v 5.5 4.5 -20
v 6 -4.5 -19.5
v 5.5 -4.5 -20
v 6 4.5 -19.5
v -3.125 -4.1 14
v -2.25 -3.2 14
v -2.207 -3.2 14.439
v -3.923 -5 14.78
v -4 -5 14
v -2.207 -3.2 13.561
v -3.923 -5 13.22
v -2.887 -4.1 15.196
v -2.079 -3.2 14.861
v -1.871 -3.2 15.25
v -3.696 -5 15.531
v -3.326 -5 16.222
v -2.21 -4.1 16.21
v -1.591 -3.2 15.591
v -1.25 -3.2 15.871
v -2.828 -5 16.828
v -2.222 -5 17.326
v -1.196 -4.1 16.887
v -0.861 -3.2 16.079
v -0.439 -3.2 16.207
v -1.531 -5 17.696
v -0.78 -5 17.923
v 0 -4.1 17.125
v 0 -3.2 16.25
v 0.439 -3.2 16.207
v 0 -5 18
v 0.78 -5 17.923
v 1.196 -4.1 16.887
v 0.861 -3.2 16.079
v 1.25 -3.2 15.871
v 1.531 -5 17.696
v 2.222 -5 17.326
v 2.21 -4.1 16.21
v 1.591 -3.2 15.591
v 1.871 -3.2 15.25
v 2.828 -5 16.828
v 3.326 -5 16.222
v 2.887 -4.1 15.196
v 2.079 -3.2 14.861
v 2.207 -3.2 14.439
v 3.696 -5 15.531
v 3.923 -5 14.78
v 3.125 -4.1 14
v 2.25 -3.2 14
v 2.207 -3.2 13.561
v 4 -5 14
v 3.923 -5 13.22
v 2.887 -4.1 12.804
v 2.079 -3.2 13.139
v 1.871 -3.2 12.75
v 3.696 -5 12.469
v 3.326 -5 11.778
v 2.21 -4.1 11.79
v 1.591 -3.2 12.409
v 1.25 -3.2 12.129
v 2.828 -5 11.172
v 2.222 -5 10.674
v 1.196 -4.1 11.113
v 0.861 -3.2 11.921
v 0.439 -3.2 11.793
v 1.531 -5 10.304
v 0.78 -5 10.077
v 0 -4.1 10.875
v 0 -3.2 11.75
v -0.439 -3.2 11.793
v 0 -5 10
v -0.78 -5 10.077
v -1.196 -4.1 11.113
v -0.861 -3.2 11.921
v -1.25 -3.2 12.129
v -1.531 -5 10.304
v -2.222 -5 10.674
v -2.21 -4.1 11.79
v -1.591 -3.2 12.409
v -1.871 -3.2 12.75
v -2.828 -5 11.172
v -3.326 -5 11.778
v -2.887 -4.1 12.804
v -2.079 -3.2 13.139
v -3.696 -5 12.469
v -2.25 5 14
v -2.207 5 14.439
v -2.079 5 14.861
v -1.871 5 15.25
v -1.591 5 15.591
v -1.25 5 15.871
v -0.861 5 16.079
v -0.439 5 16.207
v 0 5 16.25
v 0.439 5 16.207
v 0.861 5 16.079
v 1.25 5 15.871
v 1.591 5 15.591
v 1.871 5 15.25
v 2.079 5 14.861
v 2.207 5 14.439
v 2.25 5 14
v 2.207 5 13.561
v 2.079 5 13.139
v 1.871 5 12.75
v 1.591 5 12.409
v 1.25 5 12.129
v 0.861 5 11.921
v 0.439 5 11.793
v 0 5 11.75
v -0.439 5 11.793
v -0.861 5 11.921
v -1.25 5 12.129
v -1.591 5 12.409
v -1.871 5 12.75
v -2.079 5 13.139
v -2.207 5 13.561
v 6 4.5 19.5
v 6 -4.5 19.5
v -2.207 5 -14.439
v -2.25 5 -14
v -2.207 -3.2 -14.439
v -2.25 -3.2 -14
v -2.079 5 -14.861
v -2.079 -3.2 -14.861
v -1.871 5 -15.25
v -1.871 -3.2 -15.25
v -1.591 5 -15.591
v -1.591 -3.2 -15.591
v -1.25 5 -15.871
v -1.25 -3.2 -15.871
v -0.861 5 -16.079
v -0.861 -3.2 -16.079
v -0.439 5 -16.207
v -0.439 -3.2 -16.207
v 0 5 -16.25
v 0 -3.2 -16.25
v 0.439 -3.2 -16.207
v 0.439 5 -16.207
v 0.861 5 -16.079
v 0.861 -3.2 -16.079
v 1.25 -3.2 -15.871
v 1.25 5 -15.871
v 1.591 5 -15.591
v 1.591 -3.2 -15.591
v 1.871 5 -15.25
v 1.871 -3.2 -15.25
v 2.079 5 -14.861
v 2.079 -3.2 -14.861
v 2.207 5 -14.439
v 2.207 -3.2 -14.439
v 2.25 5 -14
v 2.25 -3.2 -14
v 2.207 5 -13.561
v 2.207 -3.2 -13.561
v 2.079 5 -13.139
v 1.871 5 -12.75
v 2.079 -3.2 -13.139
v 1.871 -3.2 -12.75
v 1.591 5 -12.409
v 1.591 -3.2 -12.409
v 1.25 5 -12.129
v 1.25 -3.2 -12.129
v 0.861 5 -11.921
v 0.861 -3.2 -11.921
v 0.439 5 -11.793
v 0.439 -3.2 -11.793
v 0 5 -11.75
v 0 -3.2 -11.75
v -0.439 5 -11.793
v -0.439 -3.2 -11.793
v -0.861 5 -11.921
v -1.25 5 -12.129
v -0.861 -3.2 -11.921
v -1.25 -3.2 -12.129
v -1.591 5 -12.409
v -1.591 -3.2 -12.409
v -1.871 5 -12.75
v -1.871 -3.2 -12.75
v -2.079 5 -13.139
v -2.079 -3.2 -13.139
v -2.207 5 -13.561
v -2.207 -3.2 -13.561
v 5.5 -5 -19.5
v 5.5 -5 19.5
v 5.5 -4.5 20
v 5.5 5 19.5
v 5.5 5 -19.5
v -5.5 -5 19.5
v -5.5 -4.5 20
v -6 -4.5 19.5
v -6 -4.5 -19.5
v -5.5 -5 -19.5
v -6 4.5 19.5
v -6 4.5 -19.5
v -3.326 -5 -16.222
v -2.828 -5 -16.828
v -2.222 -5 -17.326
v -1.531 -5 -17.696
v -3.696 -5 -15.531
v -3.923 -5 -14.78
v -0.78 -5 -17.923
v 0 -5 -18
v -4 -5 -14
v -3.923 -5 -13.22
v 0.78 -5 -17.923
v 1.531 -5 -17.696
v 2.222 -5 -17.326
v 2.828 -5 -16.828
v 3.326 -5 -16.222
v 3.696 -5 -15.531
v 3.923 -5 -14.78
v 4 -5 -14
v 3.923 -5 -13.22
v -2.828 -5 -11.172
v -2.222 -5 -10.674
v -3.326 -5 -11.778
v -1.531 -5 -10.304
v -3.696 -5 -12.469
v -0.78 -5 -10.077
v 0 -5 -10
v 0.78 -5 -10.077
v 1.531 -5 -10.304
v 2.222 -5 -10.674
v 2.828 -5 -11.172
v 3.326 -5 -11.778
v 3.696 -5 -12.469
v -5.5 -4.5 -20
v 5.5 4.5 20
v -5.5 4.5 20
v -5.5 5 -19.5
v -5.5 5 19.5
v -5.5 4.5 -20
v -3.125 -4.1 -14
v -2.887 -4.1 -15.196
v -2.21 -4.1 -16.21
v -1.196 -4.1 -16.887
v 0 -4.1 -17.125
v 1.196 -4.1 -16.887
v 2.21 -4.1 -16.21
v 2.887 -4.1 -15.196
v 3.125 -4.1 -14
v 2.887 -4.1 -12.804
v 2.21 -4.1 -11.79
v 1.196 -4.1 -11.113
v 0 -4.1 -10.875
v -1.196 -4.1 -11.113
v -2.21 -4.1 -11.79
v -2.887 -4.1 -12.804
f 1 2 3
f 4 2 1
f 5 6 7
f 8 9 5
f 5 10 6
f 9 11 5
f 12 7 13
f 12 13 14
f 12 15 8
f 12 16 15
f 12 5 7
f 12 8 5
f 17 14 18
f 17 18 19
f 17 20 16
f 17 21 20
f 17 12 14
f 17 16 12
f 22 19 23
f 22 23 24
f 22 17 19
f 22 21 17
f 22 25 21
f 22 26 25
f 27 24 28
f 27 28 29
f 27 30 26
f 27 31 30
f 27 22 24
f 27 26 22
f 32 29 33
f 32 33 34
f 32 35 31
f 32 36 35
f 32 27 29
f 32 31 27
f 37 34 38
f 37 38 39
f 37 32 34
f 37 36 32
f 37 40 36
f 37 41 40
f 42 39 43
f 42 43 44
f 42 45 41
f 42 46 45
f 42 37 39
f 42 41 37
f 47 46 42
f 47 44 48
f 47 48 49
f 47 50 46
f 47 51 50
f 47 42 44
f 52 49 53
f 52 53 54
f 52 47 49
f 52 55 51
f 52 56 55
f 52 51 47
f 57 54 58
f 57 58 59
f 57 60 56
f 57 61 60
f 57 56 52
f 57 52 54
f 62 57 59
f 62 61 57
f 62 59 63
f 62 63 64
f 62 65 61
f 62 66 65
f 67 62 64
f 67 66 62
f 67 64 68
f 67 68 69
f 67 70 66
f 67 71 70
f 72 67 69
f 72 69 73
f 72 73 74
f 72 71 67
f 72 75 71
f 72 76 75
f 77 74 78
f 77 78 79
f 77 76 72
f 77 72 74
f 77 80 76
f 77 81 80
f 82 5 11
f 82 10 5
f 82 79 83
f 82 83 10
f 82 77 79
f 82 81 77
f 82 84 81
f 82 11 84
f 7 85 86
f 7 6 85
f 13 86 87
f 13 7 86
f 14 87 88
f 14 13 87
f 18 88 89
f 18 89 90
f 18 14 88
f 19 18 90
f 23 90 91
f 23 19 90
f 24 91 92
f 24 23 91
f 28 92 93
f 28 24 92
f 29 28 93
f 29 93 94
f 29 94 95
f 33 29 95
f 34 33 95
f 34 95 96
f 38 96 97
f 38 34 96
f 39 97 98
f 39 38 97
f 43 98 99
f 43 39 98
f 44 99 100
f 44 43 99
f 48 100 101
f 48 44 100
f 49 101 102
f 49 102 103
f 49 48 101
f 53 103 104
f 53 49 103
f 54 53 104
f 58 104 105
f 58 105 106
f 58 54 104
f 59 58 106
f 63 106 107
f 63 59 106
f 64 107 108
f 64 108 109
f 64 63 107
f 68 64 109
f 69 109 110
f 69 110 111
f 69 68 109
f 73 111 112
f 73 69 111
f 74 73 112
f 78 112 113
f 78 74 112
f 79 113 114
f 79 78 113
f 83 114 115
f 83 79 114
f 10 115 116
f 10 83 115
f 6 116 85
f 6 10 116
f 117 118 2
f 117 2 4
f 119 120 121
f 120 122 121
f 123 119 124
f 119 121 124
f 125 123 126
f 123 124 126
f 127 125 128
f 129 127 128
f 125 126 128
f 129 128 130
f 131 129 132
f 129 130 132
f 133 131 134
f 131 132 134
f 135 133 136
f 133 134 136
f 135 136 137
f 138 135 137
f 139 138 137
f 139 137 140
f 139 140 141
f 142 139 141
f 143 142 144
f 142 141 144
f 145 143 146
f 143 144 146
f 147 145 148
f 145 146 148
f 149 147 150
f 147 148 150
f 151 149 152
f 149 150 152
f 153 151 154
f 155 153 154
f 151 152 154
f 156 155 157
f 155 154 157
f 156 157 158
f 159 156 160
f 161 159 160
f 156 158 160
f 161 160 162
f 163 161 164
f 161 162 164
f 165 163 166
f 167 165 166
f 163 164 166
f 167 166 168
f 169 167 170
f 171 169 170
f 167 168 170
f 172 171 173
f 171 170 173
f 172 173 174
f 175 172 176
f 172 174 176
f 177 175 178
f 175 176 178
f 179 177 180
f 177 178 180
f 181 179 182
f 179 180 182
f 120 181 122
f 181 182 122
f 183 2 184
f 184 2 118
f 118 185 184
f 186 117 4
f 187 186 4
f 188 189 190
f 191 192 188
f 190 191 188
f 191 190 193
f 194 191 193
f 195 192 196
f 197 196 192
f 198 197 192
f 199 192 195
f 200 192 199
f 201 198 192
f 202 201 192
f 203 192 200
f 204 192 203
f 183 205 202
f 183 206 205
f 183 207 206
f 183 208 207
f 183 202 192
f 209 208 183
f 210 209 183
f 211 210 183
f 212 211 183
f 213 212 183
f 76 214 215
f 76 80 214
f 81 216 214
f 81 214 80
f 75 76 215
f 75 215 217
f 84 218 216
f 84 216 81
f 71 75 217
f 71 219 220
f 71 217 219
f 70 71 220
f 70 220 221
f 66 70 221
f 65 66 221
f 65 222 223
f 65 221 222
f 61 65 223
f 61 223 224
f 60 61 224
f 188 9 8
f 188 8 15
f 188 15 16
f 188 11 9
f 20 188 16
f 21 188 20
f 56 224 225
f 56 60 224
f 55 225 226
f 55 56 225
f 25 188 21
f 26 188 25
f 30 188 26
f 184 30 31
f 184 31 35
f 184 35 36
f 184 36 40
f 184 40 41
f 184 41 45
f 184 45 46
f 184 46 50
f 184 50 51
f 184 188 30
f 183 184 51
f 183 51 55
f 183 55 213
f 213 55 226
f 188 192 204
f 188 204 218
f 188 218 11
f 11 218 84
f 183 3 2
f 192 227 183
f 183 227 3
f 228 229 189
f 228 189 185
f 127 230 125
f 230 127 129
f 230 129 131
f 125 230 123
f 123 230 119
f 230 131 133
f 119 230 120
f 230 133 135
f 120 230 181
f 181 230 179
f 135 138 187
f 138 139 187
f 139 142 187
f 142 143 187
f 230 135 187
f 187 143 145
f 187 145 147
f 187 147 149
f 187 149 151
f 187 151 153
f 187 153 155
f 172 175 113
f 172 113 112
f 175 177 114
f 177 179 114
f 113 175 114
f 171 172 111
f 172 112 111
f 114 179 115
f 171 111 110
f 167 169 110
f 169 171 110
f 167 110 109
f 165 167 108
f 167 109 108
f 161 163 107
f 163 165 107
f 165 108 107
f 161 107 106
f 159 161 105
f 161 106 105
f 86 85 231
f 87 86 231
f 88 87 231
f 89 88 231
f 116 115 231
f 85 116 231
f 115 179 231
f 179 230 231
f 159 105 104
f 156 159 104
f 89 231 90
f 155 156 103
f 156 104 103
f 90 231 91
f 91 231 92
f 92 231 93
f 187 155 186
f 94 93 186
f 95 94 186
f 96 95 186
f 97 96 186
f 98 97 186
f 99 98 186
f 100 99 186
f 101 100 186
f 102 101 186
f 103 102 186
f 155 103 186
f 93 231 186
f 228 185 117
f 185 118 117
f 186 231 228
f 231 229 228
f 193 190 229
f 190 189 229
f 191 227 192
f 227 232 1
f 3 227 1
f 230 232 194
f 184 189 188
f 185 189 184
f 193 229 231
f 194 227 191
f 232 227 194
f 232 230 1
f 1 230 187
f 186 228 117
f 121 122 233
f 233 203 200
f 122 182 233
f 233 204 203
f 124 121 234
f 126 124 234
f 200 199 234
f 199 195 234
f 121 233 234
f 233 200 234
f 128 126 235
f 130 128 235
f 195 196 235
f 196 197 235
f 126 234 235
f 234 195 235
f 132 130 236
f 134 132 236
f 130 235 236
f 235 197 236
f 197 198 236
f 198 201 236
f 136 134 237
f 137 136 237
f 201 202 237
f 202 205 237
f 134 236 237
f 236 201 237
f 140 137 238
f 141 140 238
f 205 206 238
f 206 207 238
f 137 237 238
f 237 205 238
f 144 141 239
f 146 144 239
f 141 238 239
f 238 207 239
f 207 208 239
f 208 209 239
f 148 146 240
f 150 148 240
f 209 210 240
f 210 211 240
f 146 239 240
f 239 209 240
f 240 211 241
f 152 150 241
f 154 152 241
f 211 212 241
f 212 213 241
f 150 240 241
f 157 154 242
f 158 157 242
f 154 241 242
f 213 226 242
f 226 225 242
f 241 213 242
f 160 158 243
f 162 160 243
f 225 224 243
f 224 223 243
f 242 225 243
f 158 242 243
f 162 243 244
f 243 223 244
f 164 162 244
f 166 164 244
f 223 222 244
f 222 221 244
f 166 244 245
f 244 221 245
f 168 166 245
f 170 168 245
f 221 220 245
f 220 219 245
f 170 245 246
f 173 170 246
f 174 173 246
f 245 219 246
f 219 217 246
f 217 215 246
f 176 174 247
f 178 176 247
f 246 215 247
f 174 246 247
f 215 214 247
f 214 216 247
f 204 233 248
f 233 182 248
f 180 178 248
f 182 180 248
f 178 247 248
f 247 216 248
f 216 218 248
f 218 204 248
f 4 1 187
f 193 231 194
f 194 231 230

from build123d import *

# Parameters (mm, degrees)
CROQUIS1_W              = 12
CROQUIS1_H              = 10
SALIENTE_EXTRUIR1_DEPTH = 20
CHAFL_N1_SIZE           = 0.5


with BuildPart() as part:
    # Croquis1 → Saliente-Extruir1 (new body, symmetric)
    with BuildSketch(Plane.XY):
        Rectangle(CROQUIS1_W, CROQUIS1_H)
    extrude(amount=SALIENTE_EXTRUIR1_DEPTH, both=True)

    # Croquis3 → Cortar-Revolución1 (revolve, cut)
    with BuildSketch(Plane.XY.offset(-14)):
        Polygon((0, 5), (-2.25, 5), (-2.25, -3.2), (-4, -5), (0, -5), align=None)
    cortar_revoluci_n1 = revolve(axis=Axis((0, 5, -14), (0, -1, 0)), mode=Mode.SUBTRACT)

    # Simetría1: Cortar-Revolución1 across plane
    add(cortar_revoluci_n1.mirror(Plane.XY), mode=Mode.SUBTRACT)

    # Chaflán1
    chafl_n1_edges = [part.edges().sort_by_distance(p)[0] for p in [
        (6, 0, 20),
        (0, 5, 20),
        (-6, 0, 20),
        (0, 5, -20),
        (6, 0, -20),
        (0, -5, -20),
        (-6, 0, -20),
        (0, -5, 20),
        (-6, 5, 0),
        (6, 5, 0),
        (6, -5, 0),
        (-6, -5, 0),
    ]]
    chamfer(chafl_n1_edges, length=CHAFL_N1_SIZE)


solid = part.part
